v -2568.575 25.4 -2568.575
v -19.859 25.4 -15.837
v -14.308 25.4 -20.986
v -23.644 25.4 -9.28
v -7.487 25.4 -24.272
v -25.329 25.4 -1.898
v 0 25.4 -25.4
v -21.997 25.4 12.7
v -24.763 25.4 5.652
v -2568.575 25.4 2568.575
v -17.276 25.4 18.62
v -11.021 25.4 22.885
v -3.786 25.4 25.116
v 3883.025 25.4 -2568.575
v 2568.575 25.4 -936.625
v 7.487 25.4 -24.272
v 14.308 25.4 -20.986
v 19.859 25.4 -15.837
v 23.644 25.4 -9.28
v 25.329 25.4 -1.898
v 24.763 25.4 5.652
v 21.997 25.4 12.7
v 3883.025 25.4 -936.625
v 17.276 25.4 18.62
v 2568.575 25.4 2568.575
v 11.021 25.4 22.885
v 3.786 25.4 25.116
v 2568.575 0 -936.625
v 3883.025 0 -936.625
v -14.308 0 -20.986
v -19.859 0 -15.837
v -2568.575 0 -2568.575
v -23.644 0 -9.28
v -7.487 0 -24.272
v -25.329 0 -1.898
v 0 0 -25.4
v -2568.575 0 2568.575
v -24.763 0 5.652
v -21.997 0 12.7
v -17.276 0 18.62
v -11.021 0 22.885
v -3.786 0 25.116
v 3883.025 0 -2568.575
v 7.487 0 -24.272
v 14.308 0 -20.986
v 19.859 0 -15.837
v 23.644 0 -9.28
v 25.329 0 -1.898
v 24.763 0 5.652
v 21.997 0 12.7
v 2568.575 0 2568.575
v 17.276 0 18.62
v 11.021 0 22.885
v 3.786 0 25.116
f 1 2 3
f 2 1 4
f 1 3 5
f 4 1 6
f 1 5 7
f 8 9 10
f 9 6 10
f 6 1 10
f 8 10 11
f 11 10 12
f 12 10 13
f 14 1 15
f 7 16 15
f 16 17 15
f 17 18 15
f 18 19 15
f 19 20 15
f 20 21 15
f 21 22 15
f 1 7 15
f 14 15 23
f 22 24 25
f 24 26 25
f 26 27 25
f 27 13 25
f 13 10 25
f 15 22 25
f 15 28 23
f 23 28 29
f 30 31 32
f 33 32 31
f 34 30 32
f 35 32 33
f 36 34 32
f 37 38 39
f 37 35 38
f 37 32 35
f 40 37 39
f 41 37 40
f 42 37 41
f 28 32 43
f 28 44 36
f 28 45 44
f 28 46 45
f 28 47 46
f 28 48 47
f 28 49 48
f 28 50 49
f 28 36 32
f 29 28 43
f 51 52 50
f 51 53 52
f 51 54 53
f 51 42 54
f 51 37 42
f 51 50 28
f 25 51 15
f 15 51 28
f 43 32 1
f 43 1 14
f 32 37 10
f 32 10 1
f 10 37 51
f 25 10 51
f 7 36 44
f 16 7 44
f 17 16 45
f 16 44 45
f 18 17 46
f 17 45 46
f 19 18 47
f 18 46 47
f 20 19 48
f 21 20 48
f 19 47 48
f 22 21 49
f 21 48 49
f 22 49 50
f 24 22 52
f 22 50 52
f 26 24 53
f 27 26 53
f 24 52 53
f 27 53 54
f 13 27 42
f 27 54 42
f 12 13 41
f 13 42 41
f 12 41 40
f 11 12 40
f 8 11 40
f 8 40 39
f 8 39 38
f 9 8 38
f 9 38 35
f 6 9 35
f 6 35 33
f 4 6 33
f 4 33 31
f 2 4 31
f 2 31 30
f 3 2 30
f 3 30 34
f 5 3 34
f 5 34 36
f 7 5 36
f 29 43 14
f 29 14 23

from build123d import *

# Parameters (mm, degrees)
SKETCH1_W           = 5137.15
SKETCH1_H           = 5137.15
BOSS_EXTRUDE1_DEPTH = 25.4
SKETCH2_R           = 25.4
CUT_EXTRUDE1_DEPTH  = 3633.602403409
SKETCH3_W           = 1314.45
SKETCH3_H           = 1631.95
BOSS_EXTRUDE2_DEPTH = 25.4


with BuildPart() as part:
    # Sketch1 → Boss-Extrude1 (new body)
    with BuildSketch(Plane(origin=(0, 0, 0), x_dir=(1, 0, 0), z_dir=(0, 1, 0))):
        Rectangle(SKETCH1_W, SKETCH1_H)
    extrude(amount=BOSS_EXTRUDE1_DEPTH)

    # Sketch2 → Cut-Extrude1 (cut, through all)
    with BuildSketch(Plane.XZ):
        with Locations(Location((0, 0, 0), (0, 0, 270))):
            Circle(SKETCH2_R)
    extrude(amount=-CUT_EXTRUDE1_DEPTH, mode=Mode.SUBTRACT)

    # Sketch3 → Boss-Extrude2 (add)
    with BuildSketch(Plane.XZ):
        with Locations((3225.8, -1752.6)):
            Rectangle(SKETCH3_W, SKETCH3_H)
    extrude(amount=-BOSS_EXTRUDE2_DEPTH)


solid = part.part
